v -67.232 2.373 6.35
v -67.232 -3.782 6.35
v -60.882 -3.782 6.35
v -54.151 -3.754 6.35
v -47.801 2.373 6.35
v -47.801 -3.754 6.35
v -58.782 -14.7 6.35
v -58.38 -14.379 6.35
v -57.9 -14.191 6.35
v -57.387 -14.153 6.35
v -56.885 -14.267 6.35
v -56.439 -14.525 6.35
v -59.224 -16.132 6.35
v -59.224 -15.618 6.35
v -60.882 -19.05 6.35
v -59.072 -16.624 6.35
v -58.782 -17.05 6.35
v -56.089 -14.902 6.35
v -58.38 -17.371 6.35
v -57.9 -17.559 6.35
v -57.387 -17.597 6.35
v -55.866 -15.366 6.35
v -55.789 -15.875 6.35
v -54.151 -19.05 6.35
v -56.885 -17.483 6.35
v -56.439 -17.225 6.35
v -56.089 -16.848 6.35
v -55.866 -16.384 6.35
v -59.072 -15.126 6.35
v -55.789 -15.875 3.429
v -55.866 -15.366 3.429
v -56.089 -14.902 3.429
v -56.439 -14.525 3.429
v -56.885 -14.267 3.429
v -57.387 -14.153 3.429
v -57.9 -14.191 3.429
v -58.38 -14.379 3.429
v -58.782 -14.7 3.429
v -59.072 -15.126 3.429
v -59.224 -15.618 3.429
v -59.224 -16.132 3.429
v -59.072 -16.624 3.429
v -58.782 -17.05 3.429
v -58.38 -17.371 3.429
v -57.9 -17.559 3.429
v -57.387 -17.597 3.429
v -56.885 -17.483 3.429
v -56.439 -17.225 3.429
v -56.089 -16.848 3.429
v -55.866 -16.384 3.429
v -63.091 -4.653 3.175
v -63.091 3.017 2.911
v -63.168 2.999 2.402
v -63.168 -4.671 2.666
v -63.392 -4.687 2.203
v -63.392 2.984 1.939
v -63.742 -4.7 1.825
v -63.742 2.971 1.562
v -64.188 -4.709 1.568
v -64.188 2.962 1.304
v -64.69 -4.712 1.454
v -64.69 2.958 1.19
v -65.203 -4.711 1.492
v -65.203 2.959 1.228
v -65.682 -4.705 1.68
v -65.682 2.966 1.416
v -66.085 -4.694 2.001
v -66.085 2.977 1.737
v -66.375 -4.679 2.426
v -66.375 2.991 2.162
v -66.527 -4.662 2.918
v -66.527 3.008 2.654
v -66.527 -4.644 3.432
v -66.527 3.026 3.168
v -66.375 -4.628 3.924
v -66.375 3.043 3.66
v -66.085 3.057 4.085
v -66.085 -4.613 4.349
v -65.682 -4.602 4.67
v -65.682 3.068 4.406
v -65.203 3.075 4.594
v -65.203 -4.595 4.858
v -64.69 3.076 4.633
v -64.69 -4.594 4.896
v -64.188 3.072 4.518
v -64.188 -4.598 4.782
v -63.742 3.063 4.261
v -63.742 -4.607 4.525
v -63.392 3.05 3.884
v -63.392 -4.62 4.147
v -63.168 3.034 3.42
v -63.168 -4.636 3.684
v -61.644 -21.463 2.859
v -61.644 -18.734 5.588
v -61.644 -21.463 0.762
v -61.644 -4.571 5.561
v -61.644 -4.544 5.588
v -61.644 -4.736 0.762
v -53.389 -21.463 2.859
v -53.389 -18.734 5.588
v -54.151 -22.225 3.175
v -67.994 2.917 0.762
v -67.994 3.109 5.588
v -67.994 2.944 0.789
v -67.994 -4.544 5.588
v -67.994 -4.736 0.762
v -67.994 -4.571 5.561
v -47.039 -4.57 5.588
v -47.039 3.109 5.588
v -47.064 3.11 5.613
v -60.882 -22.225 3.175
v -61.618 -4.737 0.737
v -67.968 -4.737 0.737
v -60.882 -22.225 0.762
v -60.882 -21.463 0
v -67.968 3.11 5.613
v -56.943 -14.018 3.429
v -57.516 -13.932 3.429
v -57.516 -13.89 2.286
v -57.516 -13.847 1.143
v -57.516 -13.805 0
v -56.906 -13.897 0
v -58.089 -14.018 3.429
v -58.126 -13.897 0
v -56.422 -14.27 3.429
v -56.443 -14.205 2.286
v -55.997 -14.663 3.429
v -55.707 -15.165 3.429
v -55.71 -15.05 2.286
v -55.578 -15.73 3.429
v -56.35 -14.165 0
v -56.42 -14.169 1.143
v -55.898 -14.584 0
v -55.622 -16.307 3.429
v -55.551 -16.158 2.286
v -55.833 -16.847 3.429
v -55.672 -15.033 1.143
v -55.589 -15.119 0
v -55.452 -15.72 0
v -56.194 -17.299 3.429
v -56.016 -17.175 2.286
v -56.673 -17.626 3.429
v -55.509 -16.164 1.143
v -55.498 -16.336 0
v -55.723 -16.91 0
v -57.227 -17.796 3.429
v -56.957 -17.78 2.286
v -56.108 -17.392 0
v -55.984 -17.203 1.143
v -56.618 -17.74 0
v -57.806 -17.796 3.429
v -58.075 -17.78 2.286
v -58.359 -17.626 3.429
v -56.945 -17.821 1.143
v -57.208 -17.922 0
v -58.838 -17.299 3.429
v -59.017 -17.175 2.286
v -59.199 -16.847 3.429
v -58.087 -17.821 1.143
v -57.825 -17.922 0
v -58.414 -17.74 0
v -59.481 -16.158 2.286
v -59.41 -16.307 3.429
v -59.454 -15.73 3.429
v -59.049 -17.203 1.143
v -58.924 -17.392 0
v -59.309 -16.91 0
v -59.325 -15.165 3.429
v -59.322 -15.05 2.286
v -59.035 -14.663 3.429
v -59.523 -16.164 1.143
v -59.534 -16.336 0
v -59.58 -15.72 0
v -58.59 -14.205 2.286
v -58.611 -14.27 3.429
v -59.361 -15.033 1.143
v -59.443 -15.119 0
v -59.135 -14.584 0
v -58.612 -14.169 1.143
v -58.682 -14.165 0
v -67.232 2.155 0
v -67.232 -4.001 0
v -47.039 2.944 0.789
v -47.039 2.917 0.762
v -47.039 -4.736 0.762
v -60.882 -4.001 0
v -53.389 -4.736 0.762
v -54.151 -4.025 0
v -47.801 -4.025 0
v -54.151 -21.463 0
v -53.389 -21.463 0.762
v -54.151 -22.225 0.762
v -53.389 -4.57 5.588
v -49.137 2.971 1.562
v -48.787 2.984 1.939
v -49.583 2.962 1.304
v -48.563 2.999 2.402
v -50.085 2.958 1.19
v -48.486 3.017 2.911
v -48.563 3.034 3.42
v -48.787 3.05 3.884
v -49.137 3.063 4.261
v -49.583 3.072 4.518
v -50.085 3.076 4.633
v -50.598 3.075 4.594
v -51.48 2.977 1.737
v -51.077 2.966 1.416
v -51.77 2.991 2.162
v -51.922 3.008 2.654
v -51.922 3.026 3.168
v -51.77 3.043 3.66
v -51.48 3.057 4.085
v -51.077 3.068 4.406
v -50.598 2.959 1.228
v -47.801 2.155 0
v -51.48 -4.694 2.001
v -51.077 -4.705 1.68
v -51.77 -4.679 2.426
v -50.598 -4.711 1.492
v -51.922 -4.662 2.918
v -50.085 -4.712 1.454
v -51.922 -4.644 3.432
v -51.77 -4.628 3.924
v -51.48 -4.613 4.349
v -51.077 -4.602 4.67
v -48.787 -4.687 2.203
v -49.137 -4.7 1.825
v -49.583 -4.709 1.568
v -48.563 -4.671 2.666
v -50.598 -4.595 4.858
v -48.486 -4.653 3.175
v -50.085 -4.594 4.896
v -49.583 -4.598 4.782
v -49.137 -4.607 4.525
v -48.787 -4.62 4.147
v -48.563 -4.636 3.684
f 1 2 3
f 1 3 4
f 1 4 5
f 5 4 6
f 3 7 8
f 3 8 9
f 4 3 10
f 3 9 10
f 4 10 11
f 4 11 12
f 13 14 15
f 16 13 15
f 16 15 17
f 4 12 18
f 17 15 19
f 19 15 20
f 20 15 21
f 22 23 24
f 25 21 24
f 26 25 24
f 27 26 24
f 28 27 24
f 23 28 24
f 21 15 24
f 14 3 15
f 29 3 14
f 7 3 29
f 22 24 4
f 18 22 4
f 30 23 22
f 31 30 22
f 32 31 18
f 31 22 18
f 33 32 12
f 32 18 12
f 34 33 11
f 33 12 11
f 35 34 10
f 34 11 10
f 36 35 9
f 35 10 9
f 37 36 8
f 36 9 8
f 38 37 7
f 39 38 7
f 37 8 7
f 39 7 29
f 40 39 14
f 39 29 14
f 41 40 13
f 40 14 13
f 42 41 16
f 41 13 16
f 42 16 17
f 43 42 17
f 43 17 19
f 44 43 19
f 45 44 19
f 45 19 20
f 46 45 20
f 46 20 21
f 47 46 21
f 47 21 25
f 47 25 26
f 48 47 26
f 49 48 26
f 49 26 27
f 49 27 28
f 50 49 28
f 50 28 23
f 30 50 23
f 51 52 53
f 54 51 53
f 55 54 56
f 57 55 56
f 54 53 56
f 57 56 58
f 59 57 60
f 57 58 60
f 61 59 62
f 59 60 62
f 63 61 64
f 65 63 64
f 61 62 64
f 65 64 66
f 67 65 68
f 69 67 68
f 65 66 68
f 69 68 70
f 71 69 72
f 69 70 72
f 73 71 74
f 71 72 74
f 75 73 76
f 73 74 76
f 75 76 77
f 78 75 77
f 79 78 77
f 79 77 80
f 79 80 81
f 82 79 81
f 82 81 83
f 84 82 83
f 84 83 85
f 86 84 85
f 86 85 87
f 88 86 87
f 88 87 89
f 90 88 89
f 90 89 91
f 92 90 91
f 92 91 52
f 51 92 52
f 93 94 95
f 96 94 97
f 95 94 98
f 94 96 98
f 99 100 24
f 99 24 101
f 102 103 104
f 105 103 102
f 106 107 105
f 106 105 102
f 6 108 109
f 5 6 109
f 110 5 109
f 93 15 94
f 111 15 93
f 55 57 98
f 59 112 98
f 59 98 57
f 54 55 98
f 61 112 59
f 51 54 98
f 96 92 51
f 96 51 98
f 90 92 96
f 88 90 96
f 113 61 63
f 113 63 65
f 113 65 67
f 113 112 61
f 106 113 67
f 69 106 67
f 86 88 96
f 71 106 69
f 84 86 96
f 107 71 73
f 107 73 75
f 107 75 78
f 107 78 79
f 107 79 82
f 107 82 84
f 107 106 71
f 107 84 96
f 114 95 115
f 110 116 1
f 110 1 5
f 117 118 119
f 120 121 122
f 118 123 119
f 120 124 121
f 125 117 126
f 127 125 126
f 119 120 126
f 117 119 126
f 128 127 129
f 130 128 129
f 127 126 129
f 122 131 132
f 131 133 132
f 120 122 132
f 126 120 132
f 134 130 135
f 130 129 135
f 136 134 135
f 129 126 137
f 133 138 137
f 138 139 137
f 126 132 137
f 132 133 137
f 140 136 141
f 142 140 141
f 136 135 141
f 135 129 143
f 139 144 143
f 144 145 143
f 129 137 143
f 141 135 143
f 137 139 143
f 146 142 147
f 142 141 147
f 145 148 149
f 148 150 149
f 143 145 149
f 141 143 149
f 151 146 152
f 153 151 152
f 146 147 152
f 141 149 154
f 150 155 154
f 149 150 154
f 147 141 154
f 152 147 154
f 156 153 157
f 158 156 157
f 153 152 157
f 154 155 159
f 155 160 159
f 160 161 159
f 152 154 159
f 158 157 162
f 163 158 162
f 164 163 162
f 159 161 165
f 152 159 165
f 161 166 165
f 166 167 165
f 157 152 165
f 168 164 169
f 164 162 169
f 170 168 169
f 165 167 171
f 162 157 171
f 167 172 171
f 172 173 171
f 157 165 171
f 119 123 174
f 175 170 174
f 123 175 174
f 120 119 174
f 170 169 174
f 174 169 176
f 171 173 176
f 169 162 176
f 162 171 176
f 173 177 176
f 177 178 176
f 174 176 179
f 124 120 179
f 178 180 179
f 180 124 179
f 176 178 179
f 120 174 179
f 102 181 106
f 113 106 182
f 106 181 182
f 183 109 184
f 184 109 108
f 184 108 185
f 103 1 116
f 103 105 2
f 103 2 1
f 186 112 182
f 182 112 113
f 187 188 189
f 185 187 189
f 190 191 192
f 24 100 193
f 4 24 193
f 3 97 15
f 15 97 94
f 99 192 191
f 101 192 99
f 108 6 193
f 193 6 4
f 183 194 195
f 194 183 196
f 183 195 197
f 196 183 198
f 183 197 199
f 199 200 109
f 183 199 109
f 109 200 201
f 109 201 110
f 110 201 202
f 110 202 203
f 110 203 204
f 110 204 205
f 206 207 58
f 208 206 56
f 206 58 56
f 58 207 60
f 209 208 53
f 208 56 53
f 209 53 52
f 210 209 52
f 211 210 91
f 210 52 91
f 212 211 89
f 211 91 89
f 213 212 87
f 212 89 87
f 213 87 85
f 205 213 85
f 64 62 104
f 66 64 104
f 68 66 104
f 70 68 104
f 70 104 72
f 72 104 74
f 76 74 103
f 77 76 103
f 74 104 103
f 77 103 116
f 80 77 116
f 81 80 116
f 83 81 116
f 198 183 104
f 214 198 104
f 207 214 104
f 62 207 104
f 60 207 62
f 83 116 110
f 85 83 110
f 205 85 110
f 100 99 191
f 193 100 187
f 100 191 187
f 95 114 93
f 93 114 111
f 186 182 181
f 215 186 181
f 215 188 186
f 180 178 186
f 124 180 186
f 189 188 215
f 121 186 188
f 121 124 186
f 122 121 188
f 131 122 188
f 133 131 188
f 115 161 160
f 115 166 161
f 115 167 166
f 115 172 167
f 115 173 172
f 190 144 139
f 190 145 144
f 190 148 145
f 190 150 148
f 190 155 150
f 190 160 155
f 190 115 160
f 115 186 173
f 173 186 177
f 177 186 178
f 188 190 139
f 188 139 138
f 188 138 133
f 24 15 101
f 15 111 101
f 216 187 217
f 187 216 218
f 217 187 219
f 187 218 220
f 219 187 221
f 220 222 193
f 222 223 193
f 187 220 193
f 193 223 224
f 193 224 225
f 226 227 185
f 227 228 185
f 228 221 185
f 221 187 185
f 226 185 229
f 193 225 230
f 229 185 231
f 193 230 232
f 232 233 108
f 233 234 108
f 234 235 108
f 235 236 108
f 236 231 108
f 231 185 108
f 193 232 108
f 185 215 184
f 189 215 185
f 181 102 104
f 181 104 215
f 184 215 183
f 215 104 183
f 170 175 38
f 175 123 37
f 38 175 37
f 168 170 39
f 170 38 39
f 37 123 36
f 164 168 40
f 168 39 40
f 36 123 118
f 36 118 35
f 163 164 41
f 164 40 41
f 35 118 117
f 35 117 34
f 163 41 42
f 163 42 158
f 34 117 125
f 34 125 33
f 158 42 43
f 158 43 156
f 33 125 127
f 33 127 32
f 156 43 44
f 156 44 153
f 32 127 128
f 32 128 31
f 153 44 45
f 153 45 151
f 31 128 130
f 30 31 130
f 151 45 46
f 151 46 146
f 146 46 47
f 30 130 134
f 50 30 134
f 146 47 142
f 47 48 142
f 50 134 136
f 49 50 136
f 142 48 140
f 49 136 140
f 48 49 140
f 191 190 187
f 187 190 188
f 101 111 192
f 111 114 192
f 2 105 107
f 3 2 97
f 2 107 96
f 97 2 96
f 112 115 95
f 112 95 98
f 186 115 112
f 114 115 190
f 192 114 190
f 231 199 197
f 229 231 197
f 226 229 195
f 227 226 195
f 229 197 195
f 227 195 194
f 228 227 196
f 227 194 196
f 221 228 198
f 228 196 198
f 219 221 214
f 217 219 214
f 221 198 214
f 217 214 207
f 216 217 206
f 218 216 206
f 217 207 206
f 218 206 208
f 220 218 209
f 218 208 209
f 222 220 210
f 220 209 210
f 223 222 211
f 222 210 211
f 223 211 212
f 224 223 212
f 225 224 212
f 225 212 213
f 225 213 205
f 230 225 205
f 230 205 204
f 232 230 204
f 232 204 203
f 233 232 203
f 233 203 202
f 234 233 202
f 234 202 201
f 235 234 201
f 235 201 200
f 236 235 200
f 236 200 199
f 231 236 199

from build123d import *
from OCP.BRepFilletAPI import BRepFilletAPI_MakeChamfer

# Parameters (mm, degrees)
SKETCH1_W             = 8.255
SKETCH1_H             = 22.225
BOSS_EXTRUDE1_DEPTH   = 6.35
SKETCH2_W             = 6.35
SKETCH2_H             = 4.7625
BOSS_EXTRUDE2_DEPTH   = 6.35
BOSS_EXTRUDE3_START   = -8.255
SKETCH2_4_W           = 6.35
SKETCH2_4_H           = 4.7625
BOSS_EXTRUDE3_DEPTH   = 6.35
SKETCH4_W             = 20.955
SKETCH4_H             = 6.35
BOSS_EXTRUDE4_DEPTH   = 3.135241634
CUT_EXTRUDE3_DEPTH    = 32.199120981
CUT_EXTRUDE4_DEPTH    = 6.35
CUT_EXTRUDE5_START    = -20.955
CUT_EXTRUDE5_DEPTH    = 6.35
F_4_CLEARANCE_HOLE1_D = 3.4544
F_4_CLEARANCE_HOLE2_D = 3.4544
CHAMFER1_SIZE         = 3.175
CHAMFER2_SIZE         = 0.762
CHAMFER2_SIZE2        = 0.737097047
CHAMFER2_SIZE2_2      = 0.789610507


with BuildPart() as part:
    # Sketch1 → Boss-Extrude1 (new body)
    with BuildSketch(Plane.XY):
        with Locations((-57.516108776, -11.1125)):
            Rectangle(SKETCH1_W, SKETCH1_H)
    extrude(amount=BOSS_EXTRUDE1_DEPTH)

    # Sketch2 → Boss-Extrude2 (add)
    with BuildSketch(Plane.ZY.offset(61.643608776)):
        with Locations((3.175, -2.38125)):
            Rectangle(SKETCH2_W, SKETCH2_H)
    extrude(amount=BOSS_EXTRUDE2_DEPTH)

    # Sketch2<4> → Boss-Extrude3 (add)
    with BuildSketch(Plane.ZY.offset(61.643608776).offset(BOSS_EXTRUDE3_START)):
        with Locations((3.175, -2.38125)):
            Rectangle(SKETCH2_4_W, SKETCH2_4_H)
    extrude(amount=-BOSS_EXTRUDE3_DEPTH)

    # Sketch4 → Boss-Extrude4 (add)
    with BuildSketch(Plane(origin=(0, 0, 0), x_dir=(1, 0, 0), z_dir=(0, 1, 0))):
        with Locations((-57.516108776, -3.175)):
            Rectangle(SKETCH4_W, SKETCH4_H)
    extrude(amount=BOSS_EXTRUDE4_DEPTH)

    # Sketch5 → Cut-Extrude3 (cut, through all)
    with BuildSketch(Plane.ZY.offset(67.993608776)):
        Polygon((0, 2.916823594), (6.35, 3.135241634), (0, 3.135241634), align=None)
    extrude(amount=-CUT_EXTRUDE3_DEPTH, mode=Mode.SUBTRACT)

    # Sketch6 → Cut-Extrude4 (cut)
    with BuildSketch(Plane.ZY.offset(67.993608776)):
        Polygon((0, -4.7625), (6.35, -4.54408196), (6.35, -4.7625), align=None)
    extrude(amount=-CUT_EXTRUDE4_DEPTH, mode=Mode.SUBTRACT)

    # Sketch6<2> → Cut-Extrude5 (cut)
    with BuildSketch(Plane.ZY.offset(67.993608776).offset(CUT_EXTRUDE5_START)):
        Polygon((0, -4.7625), (6.35, -4.54408196), (6.35, -4.7625), align=None)
    extrude(amount=CUT_EXTRUDE5_DEPTH, mode=Mode.SUBTRACT)

    # #4 Clearance Hole1 (through all)
    with Locations(Plane(origin=(0, -4.75687204, 0.163619948), x_dir=(-1, 0, 0), z_dir=(0, -0.9994089633576719, 0.03437621212908539))):
        with Locations((50.213608776, -3.013160941), (64.818608776, -3.013160941)):
            Hole(F_4_CLEARANCE_HOLE1_D / 2)

    # #4 Clearance Hole2 (through all)
    with Locations(Plane(origin=(0, 0, 0), x_dir=(-1, 0, 0), z_dir=(0, 0, -1))):
        with Locations((57.516108776, -15.875)):
            Hole(F_4_CLEARANCE_HOLE2_D / 2)

    # Sketch16 → Hole1 (revolve, cut)
    with BuildSketch(Plane(origin=(-57.516108776, -15.875, 0), x_dir=(0, 1, 0), z_dir=(1, 0, 0))):
        Polygon((0, 0), (0, 3.429), (1.9431, 3.429), (2.0701, 0), align=None)
    revolve(axis=Axis((-57.516108776, -15.875, 110), (0, 0, -1)), mode=Mode.SUBTRACT)

    # Chamfer1
    chamfer1_edges = [part.edges().sort_by_distance(p)[0] for p in [
        (-57.516108776, -22.225, 6.35),
    ]]
    chamfer(chamfer1_edges, length=CHAMFER1_SIZE)

    # Chamfer2: one chamfer whose edges measure the first distance from different faces: ONE call of the kernel's chamfer builder (chamfer() names one face for all edges)
    chamfer2_edges_1 = [part.edges().sort_by_distance(p)[0] for p in [
        (-53.388608776, -11.79704098, 6.35),
        (-53.388608776, -22.225, 1.5875),
        (-53.388608776, -20.6375, 4.7625),
        (-61.643608776, -22.225, 1.5875),
        (-61.643608776, -20.6375, 4.7625),
        (-61.643608776, -13.49375, 0),
        (-61.643608776, -11.79704098, 6.35),
        (-47.038608776, -0.704420163, 6.35),
        (-47.038608776, -0.922838203, 0),
        (-67.993608776, -0.922838203, 0),
        (-53.388608776, -13.49375, 0),
        (-57.516108776, -22.225, 0),
        (-67.993608776, -0.704420163, 6.35),
    ]]
    chamfer2_edges_2 = [part.edges().sort_by_distance(p)[0] for p in [
        (-64.818608776, -4.7625, 0),
    ]]
    chamfer2_side_2 = [part.faces().sort_by_distance(p)[0] for p in [
        (-57.516108776, -6.446773357, 0),
    ]]
    chamfer2_edges_3 = [part.edges().sort_by_distance(p)[0] for p in [
        (-50.213608776, -4.7625, 0),
    ]]
    chamfer2_side_3 = [part.faces().sort_by_distance(p)[0] for p in [
        (-50.213608776, -4.759412015, 0.089776027),
    ]]
    chamfer2_edges_4 = [part.edges().sort_by_distance(p)[0] for p in [
        (-57.516108776, 3.135241634, 6.35),
    ]]
    chamfer2_side_4 = [part.faces().sort_by_distance(p)[0] for p in [
        (-57.516108776, -5.076499977, 6.35),
    ]]
    chamfer2_edges_5 = [part.edges().sort_by_distance(p)[0] for p in [
        (-57.516108776, 2.916823594, 0),
    ]]
    chamfer2_side_5 = [part.faces().sort_by_distance(p)[0] for p in [
        (-57.516108776, -6.446773357, 0),
    ]]
    chamfer2_edges_6 = [part.edges().sort_by_distance(p)[0] for p in [
        (-64.818608776, -4.54408196, 6.35),
    ]]
    chamfer2_side_6 = [part.faces().sort_by_distance(p)[0] for p in [
        (-57.516108776, -5.076499977, 6.35),
    ]]
    chamfer2_edges_7 = [part.edges().sort_by_distance(p)[0] for p in [
        (-50.213608776, -4.54408196, 6.35),
    ]]
    chamfer2_side_7 = [part.faces().sort_by_distance(p)[0] for p in [
        (-50.213608776, -4.759412015, 0.089776027),
    ]]
    chamfer2 = BRepFilletAPI_MakeChamfer(part.part.solid().wrapped)
    for e in chamfer2_edges_1:
        chamfer2.Add(CHAMFER2_SIZE, e.wrapped)
    for e in chamfer2_edges_2:
        chamfer2.Add(CHAMFER2_SIZE, CHAMFER2_SIZE2, e.wrapped, chamfer2_side_2[0].wrapped)  # the first distance lies on this face
    for e in chamfer2_edges_3:
        chamfer2.Add(CHAMFER2_SIZE, CHAMFER2_SIZE2, e.wrapped, chamfer2_side_3[0].wrapped)  # the first distance lies on this face
    for e in chamfer2_edges_4:
        chamfer2.Add(CHAMFER2_SIZE, CHAMFER2_SIZE2, e.wrapped, chamfer2_side_4[0].wrapped)  # the first distance lies on this face
    for e in chamfer2_edges_5:
        chamfer2.Add(CHAMFER2_SIZE, CHAMFER2_SIZE2_2, e.wrapped, chamfer2_side_5[0].wrapped)  # the first distance lies on this face
    for e in chamfer2_edges_6:
        chamfer2.Add(CHAMFER2_SIZE, CHAMFER2_SIZE2_2, e.wrapped, chamfer2_side_6[0].wrapped)  # the first distance lies on this face
    for e in chamfer2_edges_7:
        chamfer2.Add(CHAMFER2_SIZE, CHAMFER2_SIZE2_2, e.wrapped, chamfer2_side_7[0].wrapped)  # the first distance lies on this face
    add(Compound.cast(chamfer2.Shape()), mode=Mode.REPLACE)


solid = part.part
